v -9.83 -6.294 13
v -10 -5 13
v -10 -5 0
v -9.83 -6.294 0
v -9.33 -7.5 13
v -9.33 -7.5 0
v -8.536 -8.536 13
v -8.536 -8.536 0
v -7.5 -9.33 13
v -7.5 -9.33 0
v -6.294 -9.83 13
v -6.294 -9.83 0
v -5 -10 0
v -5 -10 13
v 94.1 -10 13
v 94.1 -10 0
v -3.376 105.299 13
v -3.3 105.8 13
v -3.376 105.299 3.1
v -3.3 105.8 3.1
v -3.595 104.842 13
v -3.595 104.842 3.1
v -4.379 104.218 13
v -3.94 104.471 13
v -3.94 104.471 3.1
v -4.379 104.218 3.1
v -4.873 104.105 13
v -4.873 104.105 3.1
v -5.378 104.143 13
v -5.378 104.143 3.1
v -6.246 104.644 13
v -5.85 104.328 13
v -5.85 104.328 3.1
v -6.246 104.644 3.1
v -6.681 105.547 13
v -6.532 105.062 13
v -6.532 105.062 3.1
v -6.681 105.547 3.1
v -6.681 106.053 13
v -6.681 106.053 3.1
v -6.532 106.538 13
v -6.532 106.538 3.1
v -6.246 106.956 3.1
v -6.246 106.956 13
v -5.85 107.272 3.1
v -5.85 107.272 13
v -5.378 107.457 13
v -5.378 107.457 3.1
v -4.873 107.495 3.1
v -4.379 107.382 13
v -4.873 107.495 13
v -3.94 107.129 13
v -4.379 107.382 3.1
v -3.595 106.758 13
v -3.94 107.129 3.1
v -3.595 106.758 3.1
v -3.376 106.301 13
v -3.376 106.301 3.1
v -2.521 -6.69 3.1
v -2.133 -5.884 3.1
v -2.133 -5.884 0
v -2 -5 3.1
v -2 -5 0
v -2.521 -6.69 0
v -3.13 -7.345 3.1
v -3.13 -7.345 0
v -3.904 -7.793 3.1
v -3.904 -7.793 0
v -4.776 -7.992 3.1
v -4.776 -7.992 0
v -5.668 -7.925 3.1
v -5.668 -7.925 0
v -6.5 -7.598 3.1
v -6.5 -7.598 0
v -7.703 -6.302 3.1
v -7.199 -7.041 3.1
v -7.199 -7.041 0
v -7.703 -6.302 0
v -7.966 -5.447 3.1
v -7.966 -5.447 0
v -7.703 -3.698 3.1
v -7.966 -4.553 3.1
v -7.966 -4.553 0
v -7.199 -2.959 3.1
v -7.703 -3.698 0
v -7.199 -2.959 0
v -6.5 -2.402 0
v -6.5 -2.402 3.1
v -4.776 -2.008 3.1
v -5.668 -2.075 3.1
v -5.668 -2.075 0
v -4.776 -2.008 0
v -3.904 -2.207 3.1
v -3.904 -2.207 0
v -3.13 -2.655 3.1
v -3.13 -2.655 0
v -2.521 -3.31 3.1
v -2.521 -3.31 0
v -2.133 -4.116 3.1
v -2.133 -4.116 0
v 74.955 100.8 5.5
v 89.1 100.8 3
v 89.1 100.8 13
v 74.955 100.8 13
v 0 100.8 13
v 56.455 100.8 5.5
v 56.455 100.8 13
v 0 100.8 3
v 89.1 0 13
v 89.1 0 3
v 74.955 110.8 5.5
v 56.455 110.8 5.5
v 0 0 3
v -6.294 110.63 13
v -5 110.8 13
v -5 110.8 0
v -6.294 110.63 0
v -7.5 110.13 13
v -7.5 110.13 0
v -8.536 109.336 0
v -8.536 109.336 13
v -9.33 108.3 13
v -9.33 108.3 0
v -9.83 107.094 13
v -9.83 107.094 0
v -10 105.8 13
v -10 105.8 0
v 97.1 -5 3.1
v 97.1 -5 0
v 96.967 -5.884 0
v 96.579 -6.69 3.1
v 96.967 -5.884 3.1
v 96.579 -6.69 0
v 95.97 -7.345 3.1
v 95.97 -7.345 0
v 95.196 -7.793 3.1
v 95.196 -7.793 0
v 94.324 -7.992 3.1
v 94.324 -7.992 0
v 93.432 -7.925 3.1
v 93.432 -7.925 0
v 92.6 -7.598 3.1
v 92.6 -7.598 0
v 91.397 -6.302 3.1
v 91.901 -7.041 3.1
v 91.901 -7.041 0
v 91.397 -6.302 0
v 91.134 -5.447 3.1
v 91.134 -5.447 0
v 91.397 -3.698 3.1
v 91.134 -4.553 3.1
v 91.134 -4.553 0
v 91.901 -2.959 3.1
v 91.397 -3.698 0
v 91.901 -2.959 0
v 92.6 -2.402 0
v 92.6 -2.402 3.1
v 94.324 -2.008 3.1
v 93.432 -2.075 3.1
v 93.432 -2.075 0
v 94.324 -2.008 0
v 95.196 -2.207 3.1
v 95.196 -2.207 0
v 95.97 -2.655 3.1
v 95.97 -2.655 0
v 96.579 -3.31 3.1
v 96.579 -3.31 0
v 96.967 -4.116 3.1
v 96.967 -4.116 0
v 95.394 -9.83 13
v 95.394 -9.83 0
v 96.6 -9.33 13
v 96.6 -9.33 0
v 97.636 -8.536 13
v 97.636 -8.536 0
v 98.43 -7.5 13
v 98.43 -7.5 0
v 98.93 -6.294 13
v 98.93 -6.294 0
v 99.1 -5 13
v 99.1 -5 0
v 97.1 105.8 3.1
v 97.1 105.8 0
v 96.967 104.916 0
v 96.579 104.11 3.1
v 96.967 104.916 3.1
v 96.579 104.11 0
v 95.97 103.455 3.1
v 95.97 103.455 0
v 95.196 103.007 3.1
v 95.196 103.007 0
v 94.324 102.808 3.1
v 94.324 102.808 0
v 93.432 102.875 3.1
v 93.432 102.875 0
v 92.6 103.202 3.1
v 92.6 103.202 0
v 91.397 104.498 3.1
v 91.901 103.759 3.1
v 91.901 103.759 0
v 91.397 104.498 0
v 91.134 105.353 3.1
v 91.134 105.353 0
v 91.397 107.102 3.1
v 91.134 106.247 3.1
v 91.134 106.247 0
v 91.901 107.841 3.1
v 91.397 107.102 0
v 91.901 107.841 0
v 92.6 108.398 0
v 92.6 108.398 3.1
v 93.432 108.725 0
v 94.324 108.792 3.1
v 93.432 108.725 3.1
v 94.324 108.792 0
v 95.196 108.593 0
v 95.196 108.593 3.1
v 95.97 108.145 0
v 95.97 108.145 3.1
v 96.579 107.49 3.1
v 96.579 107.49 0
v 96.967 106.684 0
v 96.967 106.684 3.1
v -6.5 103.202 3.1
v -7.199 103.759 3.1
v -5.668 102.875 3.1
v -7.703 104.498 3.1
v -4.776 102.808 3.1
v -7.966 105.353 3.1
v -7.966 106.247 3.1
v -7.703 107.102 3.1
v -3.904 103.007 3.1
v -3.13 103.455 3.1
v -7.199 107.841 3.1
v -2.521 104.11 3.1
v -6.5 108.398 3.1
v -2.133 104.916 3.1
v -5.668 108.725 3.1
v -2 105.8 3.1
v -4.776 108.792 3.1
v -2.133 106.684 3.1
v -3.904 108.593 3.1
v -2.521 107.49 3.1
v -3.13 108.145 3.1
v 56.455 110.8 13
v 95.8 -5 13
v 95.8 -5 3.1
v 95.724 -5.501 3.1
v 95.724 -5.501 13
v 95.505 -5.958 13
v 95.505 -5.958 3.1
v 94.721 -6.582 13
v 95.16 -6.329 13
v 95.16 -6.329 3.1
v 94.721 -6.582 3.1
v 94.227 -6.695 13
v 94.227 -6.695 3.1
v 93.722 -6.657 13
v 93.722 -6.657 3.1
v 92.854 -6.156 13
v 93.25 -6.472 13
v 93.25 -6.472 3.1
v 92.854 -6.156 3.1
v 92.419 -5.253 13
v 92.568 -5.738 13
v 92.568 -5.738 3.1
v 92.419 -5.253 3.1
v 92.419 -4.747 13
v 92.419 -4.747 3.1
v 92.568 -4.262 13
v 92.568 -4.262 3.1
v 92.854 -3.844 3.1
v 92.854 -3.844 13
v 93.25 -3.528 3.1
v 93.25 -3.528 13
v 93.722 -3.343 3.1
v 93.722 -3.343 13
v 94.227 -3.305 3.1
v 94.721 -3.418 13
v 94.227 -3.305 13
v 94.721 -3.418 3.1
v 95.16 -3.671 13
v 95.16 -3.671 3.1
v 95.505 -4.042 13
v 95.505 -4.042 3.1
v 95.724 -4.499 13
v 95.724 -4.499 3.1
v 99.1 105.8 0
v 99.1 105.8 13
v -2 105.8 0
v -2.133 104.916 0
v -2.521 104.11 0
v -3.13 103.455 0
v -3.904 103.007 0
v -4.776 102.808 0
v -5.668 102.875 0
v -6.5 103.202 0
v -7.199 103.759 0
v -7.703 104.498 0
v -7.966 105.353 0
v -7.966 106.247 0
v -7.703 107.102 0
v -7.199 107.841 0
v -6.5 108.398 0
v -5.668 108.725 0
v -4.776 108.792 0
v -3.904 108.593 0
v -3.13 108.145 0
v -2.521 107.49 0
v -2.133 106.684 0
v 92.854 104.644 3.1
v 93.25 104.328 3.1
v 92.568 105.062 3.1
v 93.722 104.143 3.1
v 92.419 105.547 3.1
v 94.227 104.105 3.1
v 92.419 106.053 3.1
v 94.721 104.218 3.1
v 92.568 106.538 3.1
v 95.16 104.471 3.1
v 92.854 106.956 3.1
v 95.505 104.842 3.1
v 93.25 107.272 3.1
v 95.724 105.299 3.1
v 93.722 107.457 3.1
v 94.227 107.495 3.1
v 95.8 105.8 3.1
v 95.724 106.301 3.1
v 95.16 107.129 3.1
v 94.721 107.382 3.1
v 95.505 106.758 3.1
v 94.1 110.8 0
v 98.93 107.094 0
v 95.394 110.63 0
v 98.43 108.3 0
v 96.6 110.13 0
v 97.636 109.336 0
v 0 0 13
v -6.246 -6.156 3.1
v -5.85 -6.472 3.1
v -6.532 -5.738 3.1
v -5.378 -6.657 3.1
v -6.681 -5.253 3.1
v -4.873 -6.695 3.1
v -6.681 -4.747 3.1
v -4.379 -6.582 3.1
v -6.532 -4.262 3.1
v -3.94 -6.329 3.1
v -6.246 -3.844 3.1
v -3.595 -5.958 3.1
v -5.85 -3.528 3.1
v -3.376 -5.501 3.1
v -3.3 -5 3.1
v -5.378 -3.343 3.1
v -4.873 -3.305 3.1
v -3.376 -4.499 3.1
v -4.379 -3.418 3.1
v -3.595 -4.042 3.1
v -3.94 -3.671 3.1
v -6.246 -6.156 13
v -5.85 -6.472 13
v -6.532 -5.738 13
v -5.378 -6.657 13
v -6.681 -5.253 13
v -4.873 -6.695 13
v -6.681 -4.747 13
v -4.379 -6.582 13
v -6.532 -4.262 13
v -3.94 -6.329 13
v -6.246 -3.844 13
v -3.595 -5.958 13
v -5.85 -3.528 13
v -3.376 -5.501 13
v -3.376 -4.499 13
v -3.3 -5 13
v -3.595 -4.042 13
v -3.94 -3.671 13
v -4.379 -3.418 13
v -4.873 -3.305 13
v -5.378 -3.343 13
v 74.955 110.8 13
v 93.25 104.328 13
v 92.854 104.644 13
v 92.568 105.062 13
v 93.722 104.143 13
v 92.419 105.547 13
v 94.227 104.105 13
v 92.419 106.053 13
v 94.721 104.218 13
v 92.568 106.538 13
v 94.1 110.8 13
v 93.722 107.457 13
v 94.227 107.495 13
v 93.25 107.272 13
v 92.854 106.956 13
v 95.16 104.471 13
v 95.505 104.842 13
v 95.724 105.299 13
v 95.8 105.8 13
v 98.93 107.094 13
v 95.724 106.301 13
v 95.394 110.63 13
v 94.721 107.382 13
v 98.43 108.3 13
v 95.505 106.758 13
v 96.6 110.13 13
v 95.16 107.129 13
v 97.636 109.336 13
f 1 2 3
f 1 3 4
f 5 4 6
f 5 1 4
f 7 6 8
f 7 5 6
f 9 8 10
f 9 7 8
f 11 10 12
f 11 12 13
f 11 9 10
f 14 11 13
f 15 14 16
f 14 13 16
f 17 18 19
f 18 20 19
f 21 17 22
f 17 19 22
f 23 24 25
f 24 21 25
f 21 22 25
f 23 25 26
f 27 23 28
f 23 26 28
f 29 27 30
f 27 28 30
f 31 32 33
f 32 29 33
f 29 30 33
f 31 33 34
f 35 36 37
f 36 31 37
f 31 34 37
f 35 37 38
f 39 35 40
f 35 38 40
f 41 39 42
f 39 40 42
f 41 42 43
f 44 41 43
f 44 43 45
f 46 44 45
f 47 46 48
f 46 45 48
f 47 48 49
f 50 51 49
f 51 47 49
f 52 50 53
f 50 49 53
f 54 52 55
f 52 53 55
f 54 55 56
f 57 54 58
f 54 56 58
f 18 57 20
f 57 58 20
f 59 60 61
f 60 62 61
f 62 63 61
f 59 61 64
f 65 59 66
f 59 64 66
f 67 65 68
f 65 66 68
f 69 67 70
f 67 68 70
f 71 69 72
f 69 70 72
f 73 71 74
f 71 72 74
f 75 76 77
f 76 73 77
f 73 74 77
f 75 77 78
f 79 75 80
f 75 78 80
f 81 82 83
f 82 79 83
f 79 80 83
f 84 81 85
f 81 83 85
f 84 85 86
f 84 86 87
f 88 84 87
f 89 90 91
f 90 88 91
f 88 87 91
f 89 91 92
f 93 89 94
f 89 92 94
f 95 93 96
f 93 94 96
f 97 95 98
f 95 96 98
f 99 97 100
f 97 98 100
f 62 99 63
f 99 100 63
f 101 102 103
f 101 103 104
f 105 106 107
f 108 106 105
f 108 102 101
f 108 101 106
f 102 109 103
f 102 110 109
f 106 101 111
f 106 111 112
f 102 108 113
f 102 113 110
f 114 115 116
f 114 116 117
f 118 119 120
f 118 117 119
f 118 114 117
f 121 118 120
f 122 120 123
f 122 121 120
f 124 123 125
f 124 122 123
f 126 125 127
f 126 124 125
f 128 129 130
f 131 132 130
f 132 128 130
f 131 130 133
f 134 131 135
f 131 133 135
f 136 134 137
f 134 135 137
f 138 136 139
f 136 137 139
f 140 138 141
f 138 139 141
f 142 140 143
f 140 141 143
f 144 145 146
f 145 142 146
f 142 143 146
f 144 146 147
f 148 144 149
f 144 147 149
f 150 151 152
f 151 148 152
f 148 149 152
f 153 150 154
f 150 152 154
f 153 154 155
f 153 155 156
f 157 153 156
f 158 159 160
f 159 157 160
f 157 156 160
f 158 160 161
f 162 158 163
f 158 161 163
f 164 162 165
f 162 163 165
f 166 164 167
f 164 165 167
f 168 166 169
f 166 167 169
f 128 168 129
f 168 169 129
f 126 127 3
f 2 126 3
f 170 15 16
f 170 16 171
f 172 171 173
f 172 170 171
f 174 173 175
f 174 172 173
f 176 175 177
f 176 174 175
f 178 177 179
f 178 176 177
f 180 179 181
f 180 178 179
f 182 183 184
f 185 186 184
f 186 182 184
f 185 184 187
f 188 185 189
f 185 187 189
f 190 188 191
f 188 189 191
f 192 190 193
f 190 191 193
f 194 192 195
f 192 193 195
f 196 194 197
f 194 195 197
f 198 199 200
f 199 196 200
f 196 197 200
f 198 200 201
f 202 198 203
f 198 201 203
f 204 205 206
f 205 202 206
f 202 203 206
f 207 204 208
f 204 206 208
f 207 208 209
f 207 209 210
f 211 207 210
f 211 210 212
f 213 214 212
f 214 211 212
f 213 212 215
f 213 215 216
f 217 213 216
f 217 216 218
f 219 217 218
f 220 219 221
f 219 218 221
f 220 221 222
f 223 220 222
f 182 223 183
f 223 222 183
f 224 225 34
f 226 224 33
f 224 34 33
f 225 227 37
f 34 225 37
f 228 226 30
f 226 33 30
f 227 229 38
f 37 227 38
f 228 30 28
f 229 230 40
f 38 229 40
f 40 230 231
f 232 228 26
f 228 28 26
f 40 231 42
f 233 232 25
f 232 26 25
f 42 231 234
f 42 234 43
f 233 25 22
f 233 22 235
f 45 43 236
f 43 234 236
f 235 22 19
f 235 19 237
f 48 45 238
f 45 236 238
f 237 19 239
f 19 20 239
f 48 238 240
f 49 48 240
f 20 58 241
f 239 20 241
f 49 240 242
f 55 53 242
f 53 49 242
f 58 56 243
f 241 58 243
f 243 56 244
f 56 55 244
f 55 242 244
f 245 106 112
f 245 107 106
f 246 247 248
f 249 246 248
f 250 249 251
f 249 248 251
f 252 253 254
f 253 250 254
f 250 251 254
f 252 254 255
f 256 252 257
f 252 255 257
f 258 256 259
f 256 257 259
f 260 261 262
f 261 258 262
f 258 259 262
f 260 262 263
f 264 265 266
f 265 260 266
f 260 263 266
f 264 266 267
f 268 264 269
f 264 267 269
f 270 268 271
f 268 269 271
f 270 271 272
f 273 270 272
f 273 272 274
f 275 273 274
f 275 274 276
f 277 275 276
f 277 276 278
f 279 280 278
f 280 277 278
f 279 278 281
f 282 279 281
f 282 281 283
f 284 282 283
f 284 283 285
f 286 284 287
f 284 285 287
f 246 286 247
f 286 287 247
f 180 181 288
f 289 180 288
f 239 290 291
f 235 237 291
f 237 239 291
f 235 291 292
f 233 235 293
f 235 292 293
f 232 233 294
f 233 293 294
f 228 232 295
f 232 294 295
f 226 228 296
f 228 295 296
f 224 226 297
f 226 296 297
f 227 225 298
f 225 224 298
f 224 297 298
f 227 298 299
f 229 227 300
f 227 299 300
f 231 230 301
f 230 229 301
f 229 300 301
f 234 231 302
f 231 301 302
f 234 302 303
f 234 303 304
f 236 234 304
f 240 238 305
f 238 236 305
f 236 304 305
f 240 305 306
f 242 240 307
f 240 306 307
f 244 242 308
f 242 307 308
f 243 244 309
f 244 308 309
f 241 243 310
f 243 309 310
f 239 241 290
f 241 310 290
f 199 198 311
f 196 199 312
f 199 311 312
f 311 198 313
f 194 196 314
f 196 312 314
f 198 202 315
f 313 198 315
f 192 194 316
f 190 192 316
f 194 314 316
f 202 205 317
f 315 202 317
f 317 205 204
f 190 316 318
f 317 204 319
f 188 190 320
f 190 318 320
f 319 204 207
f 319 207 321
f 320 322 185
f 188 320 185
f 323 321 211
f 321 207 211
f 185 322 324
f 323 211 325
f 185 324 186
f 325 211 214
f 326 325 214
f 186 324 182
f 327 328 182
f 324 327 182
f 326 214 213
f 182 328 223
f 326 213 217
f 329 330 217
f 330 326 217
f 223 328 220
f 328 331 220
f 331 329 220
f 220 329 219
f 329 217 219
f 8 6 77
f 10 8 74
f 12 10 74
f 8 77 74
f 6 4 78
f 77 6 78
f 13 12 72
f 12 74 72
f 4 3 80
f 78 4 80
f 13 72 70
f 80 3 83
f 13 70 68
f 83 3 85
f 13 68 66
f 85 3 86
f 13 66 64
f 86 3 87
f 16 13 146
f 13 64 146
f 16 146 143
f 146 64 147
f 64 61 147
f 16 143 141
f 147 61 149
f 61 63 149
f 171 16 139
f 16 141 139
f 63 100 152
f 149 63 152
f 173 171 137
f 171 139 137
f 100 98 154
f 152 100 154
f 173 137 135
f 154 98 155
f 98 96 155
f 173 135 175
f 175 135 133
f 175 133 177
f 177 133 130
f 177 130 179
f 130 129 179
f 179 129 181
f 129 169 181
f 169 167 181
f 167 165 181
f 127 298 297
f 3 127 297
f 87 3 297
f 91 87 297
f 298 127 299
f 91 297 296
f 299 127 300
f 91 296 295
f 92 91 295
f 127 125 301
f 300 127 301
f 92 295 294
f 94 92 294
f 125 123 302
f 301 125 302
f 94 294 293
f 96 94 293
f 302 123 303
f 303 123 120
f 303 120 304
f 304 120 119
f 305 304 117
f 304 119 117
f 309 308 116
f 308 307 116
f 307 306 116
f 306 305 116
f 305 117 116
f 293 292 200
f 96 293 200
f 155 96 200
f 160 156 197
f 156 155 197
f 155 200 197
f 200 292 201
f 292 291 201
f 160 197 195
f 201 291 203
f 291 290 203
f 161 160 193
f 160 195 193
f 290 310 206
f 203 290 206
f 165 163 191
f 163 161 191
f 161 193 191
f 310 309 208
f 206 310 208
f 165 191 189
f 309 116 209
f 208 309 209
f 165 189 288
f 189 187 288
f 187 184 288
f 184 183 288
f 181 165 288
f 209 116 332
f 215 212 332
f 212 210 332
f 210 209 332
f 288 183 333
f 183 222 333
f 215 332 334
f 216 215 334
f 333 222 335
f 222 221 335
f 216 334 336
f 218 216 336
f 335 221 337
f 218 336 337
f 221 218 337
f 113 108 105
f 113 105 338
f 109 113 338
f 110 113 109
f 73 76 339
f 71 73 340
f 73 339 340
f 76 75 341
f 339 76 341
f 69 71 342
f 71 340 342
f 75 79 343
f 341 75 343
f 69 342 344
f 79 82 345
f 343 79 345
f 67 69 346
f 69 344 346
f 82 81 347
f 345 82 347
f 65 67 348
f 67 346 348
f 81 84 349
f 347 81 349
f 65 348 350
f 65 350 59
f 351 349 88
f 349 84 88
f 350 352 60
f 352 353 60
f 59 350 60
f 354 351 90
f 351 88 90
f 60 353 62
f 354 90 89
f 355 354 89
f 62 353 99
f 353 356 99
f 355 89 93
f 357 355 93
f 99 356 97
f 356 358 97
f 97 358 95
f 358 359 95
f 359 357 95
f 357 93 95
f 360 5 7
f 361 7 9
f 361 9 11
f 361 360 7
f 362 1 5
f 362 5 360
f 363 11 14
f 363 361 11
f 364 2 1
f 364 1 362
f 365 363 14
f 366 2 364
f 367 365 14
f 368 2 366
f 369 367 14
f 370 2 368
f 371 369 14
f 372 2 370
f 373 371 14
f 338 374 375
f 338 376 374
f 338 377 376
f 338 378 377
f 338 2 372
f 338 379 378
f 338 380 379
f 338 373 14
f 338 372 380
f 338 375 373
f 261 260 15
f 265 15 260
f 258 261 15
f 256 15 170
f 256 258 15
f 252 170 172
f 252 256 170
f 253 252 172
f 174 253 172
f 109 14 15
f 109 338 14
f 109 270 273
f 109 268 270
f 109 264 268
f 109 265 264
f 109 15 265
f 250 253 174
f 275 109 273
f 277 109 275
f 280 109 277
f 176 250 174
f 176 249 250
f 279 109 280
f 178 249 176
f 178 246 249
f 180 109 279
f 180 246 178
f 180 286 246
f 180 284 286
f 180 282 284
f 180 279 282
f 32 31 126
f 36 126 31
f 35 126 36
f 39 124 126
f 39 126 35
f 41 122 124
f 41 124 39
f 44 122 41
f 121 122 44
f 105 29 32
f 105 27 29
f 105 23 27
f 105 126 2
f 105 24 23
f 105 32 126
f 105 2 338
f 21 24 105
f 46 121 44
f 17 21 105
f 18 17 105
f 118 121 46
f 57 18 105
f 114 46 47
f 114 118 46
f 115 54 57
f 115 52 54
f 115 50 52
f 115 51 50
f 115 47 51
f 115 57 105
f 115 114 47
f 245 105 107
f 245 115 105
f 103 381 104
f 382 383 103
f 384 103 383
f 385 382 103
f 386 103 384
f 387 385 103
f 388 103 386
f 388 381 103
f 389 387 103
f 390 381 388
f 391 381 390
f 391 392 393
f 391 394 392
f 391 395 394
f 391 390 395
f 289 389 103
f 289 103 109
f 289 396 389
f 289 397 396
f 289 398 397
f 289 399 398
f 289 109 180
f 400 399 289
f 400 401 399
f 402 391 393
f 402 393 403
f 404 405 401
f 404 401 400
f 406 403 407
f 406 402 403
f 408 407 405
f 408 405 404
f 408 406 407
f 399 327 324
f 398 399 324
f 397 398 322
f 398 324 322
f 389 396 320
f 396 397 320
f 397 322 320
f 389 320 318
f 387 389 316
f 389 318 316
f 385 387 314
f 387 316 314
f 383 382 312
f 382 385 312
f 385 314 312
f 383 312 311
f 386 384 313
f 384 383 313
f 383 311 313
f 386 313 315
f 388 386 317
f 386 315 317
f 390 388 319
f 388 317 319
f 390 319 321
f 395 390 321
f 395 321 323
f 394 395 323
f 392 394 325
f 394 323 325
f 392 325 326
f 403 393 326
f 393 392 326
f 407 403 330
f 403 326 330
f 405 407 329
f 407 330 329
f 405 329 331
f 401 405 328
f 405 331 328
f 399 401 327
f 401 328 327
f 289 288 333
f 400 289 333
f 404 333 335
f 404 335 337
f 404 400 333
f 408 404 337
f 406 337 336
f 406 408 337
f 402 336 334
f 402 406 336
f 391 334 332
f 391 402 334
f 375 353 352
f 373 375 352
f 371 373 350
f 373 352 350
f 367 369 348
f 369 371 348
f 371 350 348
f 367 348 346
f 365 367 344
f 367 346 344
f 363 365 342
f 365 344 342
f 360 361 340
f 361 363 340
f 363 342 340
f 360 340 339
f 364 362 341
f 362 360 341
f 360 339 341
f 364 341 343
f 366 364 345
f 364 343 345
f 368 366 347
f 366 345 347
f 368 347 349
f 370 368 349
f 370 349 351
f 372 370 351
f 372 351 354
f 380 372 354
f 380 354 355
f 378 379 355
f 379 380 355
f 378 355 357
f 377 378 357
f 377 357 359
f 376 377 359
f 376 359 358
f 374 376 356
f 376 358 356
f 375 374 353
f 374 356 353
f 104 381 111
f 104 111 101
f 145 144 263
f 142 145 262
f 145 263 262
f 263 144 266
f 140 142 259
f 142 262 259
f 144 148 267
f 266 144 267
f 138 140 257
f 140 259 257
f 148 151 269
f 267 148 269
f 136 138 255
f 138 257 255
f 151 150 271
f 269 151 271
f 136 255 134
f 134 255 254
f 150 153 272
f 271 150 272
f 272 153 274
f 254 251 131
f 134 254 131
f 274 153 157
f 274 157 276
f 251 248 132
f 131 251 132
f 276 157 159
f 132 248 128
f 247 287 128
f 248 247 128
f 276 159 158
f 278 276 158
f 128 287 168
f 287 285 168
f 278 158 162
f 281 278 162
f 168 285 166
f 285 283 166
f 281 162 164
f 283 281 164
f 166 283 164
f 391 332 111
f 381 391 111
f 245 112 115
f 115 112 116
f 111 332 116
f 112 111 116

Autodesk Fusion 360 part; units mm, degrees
sketch "Schizzo1" plane through (0, 0, 0) normal (0, 0, 1) x (1, 0, 0)
  line L0 (0, 0) -> (89.1, 0)
  line L1 (89.1, 0) -> (89.1, 100.8)
  line L2 (89.1, 100.8) -> (0, 100.8)
  line L3 (0, 100.8) -> (0, 0)
  line L4 (-10, -10) -> (99.1, -10)
  line L5 (99.1, -10) -> (99.1, 110.8)
  line L6 (99.1, 110.8) -> (-10, 110.8)
  line L7 (-10, 110.8) -> (-10, -10)
  circle A0 centre (94.1, 105.8) radius 1.7
  circle A1 centre (94.1, 105.8) radius 3
  circle A2 centre (94.1, -5) radius 1.7
  circle A3 centre (94.1, -5) radius 3
  circle A4 centre (-5, -5) radius 1.7
  circle A5 centre (-5, -5) radius 3
  circle A6 centre (-5, 105.8) radius 1.7
  circle A7 centre (-5, 105.8) radius 3
  dimension "d5" = 10
  dimension "d6" = 10
  dimension "d7" = 109.1
  dimension "d8" = 89.1
  dimension "d9" = 100.8
  dimension "d10" = 120.8
  dimension "d11" = 3.4
  dimension "d14" = 6
  dimension "d15" = 3.4
  dimension "d18" = 5
  dimension "d19" = 5
  dimension "d20" = 5
  dimension "d21" = 5
  dimension "d22" = 6
  dimension "d23" = 3.4
  dimension "d24" = 5
  dimension "d25" = 5
  dimension "d26" = 6
  dimension "d27" = 3.4
  dimension "d28" = 5
  dimension "d29" = 5
  dimension "d30" = 6
extrude "Estrusione1" add sketch "Schizzo1" along normal blind 9.9 from surface at 3.1 contours A1 | A3 | A5 | A7 makes body 1 at (94.9125, -2.1121, 9.7) makes body 2 at (-2.0037, -5.1495, 9.7) makes body 3 at (92.0053, 103.6524, 9.7) makes body 4 at (-2.1809, 104.7739, 9.7)
extrude "Estrusione2" add sketch "Schizzo1" along normal blind 13 contours L4 L5 L6 L7 bodies 1 2 3 4
extrude "Estrusione3" add sketch "Schizzo1" along normal blind 3 contours L0 L1 L2 L3 bodies 1
sketch "Schizzo2" plane through (0, 0, 13) normal (0, 0, 1) x (-1, 0, 0)
  circle A0 centre (-94.1, 5) radius 1.7
  circle A1 centre (5, -105.8) radius 1.7
  line L0 (0, 0) -> (0, -100.8)
  line L1 (0, -100.8) -> (-89.1, -100.8)
  line L2 (-89.1, -100.8) -> (-89.1, 0)
  line L3 (-89.1, 0) -> (0, 0)
  line L4 (10, -110.8) -> (10, 10)
  line L5 (10, 10) -> (-99.1, 10)
  line L6 (-99.1, 10) -> (-99.1, -110.8)
  line L7 (-99.1, -110.8) -> (10, -110.8)
  circle A2 centre (5, 5) radius 1.7
  circle A3 centre (-94.1, -105.8) radius 1.7
  line L8 (-56.455, -110.8) -> (-74.955, -110.8)
  line L9 (-74.955, -110.8) -> (-74.955, -100.8)
  line L10 (-74.955, -100.8) -> (-56.455, -100.8)
  line L11 (-56.455, -100.8) -> (-56.455, -110.8)
  line L12 (10, -110.8) -> (10, 10)
  dimension "d38" = 18.5
  dimension "d39" = 66.455
extrude "Estrusione4" cut sketch "Schizzo2" against normal blind 7.5 contours L1 L7 L8 L9 L10 L11 bodies 1
fillet "Raccordo1" radius 5 4 edges at (99.1, -10, 6.5) (-10, -10, 6.5) (99.1, 110.8, 6.5) (-10, 110.8, 6.5) on bodies 1
